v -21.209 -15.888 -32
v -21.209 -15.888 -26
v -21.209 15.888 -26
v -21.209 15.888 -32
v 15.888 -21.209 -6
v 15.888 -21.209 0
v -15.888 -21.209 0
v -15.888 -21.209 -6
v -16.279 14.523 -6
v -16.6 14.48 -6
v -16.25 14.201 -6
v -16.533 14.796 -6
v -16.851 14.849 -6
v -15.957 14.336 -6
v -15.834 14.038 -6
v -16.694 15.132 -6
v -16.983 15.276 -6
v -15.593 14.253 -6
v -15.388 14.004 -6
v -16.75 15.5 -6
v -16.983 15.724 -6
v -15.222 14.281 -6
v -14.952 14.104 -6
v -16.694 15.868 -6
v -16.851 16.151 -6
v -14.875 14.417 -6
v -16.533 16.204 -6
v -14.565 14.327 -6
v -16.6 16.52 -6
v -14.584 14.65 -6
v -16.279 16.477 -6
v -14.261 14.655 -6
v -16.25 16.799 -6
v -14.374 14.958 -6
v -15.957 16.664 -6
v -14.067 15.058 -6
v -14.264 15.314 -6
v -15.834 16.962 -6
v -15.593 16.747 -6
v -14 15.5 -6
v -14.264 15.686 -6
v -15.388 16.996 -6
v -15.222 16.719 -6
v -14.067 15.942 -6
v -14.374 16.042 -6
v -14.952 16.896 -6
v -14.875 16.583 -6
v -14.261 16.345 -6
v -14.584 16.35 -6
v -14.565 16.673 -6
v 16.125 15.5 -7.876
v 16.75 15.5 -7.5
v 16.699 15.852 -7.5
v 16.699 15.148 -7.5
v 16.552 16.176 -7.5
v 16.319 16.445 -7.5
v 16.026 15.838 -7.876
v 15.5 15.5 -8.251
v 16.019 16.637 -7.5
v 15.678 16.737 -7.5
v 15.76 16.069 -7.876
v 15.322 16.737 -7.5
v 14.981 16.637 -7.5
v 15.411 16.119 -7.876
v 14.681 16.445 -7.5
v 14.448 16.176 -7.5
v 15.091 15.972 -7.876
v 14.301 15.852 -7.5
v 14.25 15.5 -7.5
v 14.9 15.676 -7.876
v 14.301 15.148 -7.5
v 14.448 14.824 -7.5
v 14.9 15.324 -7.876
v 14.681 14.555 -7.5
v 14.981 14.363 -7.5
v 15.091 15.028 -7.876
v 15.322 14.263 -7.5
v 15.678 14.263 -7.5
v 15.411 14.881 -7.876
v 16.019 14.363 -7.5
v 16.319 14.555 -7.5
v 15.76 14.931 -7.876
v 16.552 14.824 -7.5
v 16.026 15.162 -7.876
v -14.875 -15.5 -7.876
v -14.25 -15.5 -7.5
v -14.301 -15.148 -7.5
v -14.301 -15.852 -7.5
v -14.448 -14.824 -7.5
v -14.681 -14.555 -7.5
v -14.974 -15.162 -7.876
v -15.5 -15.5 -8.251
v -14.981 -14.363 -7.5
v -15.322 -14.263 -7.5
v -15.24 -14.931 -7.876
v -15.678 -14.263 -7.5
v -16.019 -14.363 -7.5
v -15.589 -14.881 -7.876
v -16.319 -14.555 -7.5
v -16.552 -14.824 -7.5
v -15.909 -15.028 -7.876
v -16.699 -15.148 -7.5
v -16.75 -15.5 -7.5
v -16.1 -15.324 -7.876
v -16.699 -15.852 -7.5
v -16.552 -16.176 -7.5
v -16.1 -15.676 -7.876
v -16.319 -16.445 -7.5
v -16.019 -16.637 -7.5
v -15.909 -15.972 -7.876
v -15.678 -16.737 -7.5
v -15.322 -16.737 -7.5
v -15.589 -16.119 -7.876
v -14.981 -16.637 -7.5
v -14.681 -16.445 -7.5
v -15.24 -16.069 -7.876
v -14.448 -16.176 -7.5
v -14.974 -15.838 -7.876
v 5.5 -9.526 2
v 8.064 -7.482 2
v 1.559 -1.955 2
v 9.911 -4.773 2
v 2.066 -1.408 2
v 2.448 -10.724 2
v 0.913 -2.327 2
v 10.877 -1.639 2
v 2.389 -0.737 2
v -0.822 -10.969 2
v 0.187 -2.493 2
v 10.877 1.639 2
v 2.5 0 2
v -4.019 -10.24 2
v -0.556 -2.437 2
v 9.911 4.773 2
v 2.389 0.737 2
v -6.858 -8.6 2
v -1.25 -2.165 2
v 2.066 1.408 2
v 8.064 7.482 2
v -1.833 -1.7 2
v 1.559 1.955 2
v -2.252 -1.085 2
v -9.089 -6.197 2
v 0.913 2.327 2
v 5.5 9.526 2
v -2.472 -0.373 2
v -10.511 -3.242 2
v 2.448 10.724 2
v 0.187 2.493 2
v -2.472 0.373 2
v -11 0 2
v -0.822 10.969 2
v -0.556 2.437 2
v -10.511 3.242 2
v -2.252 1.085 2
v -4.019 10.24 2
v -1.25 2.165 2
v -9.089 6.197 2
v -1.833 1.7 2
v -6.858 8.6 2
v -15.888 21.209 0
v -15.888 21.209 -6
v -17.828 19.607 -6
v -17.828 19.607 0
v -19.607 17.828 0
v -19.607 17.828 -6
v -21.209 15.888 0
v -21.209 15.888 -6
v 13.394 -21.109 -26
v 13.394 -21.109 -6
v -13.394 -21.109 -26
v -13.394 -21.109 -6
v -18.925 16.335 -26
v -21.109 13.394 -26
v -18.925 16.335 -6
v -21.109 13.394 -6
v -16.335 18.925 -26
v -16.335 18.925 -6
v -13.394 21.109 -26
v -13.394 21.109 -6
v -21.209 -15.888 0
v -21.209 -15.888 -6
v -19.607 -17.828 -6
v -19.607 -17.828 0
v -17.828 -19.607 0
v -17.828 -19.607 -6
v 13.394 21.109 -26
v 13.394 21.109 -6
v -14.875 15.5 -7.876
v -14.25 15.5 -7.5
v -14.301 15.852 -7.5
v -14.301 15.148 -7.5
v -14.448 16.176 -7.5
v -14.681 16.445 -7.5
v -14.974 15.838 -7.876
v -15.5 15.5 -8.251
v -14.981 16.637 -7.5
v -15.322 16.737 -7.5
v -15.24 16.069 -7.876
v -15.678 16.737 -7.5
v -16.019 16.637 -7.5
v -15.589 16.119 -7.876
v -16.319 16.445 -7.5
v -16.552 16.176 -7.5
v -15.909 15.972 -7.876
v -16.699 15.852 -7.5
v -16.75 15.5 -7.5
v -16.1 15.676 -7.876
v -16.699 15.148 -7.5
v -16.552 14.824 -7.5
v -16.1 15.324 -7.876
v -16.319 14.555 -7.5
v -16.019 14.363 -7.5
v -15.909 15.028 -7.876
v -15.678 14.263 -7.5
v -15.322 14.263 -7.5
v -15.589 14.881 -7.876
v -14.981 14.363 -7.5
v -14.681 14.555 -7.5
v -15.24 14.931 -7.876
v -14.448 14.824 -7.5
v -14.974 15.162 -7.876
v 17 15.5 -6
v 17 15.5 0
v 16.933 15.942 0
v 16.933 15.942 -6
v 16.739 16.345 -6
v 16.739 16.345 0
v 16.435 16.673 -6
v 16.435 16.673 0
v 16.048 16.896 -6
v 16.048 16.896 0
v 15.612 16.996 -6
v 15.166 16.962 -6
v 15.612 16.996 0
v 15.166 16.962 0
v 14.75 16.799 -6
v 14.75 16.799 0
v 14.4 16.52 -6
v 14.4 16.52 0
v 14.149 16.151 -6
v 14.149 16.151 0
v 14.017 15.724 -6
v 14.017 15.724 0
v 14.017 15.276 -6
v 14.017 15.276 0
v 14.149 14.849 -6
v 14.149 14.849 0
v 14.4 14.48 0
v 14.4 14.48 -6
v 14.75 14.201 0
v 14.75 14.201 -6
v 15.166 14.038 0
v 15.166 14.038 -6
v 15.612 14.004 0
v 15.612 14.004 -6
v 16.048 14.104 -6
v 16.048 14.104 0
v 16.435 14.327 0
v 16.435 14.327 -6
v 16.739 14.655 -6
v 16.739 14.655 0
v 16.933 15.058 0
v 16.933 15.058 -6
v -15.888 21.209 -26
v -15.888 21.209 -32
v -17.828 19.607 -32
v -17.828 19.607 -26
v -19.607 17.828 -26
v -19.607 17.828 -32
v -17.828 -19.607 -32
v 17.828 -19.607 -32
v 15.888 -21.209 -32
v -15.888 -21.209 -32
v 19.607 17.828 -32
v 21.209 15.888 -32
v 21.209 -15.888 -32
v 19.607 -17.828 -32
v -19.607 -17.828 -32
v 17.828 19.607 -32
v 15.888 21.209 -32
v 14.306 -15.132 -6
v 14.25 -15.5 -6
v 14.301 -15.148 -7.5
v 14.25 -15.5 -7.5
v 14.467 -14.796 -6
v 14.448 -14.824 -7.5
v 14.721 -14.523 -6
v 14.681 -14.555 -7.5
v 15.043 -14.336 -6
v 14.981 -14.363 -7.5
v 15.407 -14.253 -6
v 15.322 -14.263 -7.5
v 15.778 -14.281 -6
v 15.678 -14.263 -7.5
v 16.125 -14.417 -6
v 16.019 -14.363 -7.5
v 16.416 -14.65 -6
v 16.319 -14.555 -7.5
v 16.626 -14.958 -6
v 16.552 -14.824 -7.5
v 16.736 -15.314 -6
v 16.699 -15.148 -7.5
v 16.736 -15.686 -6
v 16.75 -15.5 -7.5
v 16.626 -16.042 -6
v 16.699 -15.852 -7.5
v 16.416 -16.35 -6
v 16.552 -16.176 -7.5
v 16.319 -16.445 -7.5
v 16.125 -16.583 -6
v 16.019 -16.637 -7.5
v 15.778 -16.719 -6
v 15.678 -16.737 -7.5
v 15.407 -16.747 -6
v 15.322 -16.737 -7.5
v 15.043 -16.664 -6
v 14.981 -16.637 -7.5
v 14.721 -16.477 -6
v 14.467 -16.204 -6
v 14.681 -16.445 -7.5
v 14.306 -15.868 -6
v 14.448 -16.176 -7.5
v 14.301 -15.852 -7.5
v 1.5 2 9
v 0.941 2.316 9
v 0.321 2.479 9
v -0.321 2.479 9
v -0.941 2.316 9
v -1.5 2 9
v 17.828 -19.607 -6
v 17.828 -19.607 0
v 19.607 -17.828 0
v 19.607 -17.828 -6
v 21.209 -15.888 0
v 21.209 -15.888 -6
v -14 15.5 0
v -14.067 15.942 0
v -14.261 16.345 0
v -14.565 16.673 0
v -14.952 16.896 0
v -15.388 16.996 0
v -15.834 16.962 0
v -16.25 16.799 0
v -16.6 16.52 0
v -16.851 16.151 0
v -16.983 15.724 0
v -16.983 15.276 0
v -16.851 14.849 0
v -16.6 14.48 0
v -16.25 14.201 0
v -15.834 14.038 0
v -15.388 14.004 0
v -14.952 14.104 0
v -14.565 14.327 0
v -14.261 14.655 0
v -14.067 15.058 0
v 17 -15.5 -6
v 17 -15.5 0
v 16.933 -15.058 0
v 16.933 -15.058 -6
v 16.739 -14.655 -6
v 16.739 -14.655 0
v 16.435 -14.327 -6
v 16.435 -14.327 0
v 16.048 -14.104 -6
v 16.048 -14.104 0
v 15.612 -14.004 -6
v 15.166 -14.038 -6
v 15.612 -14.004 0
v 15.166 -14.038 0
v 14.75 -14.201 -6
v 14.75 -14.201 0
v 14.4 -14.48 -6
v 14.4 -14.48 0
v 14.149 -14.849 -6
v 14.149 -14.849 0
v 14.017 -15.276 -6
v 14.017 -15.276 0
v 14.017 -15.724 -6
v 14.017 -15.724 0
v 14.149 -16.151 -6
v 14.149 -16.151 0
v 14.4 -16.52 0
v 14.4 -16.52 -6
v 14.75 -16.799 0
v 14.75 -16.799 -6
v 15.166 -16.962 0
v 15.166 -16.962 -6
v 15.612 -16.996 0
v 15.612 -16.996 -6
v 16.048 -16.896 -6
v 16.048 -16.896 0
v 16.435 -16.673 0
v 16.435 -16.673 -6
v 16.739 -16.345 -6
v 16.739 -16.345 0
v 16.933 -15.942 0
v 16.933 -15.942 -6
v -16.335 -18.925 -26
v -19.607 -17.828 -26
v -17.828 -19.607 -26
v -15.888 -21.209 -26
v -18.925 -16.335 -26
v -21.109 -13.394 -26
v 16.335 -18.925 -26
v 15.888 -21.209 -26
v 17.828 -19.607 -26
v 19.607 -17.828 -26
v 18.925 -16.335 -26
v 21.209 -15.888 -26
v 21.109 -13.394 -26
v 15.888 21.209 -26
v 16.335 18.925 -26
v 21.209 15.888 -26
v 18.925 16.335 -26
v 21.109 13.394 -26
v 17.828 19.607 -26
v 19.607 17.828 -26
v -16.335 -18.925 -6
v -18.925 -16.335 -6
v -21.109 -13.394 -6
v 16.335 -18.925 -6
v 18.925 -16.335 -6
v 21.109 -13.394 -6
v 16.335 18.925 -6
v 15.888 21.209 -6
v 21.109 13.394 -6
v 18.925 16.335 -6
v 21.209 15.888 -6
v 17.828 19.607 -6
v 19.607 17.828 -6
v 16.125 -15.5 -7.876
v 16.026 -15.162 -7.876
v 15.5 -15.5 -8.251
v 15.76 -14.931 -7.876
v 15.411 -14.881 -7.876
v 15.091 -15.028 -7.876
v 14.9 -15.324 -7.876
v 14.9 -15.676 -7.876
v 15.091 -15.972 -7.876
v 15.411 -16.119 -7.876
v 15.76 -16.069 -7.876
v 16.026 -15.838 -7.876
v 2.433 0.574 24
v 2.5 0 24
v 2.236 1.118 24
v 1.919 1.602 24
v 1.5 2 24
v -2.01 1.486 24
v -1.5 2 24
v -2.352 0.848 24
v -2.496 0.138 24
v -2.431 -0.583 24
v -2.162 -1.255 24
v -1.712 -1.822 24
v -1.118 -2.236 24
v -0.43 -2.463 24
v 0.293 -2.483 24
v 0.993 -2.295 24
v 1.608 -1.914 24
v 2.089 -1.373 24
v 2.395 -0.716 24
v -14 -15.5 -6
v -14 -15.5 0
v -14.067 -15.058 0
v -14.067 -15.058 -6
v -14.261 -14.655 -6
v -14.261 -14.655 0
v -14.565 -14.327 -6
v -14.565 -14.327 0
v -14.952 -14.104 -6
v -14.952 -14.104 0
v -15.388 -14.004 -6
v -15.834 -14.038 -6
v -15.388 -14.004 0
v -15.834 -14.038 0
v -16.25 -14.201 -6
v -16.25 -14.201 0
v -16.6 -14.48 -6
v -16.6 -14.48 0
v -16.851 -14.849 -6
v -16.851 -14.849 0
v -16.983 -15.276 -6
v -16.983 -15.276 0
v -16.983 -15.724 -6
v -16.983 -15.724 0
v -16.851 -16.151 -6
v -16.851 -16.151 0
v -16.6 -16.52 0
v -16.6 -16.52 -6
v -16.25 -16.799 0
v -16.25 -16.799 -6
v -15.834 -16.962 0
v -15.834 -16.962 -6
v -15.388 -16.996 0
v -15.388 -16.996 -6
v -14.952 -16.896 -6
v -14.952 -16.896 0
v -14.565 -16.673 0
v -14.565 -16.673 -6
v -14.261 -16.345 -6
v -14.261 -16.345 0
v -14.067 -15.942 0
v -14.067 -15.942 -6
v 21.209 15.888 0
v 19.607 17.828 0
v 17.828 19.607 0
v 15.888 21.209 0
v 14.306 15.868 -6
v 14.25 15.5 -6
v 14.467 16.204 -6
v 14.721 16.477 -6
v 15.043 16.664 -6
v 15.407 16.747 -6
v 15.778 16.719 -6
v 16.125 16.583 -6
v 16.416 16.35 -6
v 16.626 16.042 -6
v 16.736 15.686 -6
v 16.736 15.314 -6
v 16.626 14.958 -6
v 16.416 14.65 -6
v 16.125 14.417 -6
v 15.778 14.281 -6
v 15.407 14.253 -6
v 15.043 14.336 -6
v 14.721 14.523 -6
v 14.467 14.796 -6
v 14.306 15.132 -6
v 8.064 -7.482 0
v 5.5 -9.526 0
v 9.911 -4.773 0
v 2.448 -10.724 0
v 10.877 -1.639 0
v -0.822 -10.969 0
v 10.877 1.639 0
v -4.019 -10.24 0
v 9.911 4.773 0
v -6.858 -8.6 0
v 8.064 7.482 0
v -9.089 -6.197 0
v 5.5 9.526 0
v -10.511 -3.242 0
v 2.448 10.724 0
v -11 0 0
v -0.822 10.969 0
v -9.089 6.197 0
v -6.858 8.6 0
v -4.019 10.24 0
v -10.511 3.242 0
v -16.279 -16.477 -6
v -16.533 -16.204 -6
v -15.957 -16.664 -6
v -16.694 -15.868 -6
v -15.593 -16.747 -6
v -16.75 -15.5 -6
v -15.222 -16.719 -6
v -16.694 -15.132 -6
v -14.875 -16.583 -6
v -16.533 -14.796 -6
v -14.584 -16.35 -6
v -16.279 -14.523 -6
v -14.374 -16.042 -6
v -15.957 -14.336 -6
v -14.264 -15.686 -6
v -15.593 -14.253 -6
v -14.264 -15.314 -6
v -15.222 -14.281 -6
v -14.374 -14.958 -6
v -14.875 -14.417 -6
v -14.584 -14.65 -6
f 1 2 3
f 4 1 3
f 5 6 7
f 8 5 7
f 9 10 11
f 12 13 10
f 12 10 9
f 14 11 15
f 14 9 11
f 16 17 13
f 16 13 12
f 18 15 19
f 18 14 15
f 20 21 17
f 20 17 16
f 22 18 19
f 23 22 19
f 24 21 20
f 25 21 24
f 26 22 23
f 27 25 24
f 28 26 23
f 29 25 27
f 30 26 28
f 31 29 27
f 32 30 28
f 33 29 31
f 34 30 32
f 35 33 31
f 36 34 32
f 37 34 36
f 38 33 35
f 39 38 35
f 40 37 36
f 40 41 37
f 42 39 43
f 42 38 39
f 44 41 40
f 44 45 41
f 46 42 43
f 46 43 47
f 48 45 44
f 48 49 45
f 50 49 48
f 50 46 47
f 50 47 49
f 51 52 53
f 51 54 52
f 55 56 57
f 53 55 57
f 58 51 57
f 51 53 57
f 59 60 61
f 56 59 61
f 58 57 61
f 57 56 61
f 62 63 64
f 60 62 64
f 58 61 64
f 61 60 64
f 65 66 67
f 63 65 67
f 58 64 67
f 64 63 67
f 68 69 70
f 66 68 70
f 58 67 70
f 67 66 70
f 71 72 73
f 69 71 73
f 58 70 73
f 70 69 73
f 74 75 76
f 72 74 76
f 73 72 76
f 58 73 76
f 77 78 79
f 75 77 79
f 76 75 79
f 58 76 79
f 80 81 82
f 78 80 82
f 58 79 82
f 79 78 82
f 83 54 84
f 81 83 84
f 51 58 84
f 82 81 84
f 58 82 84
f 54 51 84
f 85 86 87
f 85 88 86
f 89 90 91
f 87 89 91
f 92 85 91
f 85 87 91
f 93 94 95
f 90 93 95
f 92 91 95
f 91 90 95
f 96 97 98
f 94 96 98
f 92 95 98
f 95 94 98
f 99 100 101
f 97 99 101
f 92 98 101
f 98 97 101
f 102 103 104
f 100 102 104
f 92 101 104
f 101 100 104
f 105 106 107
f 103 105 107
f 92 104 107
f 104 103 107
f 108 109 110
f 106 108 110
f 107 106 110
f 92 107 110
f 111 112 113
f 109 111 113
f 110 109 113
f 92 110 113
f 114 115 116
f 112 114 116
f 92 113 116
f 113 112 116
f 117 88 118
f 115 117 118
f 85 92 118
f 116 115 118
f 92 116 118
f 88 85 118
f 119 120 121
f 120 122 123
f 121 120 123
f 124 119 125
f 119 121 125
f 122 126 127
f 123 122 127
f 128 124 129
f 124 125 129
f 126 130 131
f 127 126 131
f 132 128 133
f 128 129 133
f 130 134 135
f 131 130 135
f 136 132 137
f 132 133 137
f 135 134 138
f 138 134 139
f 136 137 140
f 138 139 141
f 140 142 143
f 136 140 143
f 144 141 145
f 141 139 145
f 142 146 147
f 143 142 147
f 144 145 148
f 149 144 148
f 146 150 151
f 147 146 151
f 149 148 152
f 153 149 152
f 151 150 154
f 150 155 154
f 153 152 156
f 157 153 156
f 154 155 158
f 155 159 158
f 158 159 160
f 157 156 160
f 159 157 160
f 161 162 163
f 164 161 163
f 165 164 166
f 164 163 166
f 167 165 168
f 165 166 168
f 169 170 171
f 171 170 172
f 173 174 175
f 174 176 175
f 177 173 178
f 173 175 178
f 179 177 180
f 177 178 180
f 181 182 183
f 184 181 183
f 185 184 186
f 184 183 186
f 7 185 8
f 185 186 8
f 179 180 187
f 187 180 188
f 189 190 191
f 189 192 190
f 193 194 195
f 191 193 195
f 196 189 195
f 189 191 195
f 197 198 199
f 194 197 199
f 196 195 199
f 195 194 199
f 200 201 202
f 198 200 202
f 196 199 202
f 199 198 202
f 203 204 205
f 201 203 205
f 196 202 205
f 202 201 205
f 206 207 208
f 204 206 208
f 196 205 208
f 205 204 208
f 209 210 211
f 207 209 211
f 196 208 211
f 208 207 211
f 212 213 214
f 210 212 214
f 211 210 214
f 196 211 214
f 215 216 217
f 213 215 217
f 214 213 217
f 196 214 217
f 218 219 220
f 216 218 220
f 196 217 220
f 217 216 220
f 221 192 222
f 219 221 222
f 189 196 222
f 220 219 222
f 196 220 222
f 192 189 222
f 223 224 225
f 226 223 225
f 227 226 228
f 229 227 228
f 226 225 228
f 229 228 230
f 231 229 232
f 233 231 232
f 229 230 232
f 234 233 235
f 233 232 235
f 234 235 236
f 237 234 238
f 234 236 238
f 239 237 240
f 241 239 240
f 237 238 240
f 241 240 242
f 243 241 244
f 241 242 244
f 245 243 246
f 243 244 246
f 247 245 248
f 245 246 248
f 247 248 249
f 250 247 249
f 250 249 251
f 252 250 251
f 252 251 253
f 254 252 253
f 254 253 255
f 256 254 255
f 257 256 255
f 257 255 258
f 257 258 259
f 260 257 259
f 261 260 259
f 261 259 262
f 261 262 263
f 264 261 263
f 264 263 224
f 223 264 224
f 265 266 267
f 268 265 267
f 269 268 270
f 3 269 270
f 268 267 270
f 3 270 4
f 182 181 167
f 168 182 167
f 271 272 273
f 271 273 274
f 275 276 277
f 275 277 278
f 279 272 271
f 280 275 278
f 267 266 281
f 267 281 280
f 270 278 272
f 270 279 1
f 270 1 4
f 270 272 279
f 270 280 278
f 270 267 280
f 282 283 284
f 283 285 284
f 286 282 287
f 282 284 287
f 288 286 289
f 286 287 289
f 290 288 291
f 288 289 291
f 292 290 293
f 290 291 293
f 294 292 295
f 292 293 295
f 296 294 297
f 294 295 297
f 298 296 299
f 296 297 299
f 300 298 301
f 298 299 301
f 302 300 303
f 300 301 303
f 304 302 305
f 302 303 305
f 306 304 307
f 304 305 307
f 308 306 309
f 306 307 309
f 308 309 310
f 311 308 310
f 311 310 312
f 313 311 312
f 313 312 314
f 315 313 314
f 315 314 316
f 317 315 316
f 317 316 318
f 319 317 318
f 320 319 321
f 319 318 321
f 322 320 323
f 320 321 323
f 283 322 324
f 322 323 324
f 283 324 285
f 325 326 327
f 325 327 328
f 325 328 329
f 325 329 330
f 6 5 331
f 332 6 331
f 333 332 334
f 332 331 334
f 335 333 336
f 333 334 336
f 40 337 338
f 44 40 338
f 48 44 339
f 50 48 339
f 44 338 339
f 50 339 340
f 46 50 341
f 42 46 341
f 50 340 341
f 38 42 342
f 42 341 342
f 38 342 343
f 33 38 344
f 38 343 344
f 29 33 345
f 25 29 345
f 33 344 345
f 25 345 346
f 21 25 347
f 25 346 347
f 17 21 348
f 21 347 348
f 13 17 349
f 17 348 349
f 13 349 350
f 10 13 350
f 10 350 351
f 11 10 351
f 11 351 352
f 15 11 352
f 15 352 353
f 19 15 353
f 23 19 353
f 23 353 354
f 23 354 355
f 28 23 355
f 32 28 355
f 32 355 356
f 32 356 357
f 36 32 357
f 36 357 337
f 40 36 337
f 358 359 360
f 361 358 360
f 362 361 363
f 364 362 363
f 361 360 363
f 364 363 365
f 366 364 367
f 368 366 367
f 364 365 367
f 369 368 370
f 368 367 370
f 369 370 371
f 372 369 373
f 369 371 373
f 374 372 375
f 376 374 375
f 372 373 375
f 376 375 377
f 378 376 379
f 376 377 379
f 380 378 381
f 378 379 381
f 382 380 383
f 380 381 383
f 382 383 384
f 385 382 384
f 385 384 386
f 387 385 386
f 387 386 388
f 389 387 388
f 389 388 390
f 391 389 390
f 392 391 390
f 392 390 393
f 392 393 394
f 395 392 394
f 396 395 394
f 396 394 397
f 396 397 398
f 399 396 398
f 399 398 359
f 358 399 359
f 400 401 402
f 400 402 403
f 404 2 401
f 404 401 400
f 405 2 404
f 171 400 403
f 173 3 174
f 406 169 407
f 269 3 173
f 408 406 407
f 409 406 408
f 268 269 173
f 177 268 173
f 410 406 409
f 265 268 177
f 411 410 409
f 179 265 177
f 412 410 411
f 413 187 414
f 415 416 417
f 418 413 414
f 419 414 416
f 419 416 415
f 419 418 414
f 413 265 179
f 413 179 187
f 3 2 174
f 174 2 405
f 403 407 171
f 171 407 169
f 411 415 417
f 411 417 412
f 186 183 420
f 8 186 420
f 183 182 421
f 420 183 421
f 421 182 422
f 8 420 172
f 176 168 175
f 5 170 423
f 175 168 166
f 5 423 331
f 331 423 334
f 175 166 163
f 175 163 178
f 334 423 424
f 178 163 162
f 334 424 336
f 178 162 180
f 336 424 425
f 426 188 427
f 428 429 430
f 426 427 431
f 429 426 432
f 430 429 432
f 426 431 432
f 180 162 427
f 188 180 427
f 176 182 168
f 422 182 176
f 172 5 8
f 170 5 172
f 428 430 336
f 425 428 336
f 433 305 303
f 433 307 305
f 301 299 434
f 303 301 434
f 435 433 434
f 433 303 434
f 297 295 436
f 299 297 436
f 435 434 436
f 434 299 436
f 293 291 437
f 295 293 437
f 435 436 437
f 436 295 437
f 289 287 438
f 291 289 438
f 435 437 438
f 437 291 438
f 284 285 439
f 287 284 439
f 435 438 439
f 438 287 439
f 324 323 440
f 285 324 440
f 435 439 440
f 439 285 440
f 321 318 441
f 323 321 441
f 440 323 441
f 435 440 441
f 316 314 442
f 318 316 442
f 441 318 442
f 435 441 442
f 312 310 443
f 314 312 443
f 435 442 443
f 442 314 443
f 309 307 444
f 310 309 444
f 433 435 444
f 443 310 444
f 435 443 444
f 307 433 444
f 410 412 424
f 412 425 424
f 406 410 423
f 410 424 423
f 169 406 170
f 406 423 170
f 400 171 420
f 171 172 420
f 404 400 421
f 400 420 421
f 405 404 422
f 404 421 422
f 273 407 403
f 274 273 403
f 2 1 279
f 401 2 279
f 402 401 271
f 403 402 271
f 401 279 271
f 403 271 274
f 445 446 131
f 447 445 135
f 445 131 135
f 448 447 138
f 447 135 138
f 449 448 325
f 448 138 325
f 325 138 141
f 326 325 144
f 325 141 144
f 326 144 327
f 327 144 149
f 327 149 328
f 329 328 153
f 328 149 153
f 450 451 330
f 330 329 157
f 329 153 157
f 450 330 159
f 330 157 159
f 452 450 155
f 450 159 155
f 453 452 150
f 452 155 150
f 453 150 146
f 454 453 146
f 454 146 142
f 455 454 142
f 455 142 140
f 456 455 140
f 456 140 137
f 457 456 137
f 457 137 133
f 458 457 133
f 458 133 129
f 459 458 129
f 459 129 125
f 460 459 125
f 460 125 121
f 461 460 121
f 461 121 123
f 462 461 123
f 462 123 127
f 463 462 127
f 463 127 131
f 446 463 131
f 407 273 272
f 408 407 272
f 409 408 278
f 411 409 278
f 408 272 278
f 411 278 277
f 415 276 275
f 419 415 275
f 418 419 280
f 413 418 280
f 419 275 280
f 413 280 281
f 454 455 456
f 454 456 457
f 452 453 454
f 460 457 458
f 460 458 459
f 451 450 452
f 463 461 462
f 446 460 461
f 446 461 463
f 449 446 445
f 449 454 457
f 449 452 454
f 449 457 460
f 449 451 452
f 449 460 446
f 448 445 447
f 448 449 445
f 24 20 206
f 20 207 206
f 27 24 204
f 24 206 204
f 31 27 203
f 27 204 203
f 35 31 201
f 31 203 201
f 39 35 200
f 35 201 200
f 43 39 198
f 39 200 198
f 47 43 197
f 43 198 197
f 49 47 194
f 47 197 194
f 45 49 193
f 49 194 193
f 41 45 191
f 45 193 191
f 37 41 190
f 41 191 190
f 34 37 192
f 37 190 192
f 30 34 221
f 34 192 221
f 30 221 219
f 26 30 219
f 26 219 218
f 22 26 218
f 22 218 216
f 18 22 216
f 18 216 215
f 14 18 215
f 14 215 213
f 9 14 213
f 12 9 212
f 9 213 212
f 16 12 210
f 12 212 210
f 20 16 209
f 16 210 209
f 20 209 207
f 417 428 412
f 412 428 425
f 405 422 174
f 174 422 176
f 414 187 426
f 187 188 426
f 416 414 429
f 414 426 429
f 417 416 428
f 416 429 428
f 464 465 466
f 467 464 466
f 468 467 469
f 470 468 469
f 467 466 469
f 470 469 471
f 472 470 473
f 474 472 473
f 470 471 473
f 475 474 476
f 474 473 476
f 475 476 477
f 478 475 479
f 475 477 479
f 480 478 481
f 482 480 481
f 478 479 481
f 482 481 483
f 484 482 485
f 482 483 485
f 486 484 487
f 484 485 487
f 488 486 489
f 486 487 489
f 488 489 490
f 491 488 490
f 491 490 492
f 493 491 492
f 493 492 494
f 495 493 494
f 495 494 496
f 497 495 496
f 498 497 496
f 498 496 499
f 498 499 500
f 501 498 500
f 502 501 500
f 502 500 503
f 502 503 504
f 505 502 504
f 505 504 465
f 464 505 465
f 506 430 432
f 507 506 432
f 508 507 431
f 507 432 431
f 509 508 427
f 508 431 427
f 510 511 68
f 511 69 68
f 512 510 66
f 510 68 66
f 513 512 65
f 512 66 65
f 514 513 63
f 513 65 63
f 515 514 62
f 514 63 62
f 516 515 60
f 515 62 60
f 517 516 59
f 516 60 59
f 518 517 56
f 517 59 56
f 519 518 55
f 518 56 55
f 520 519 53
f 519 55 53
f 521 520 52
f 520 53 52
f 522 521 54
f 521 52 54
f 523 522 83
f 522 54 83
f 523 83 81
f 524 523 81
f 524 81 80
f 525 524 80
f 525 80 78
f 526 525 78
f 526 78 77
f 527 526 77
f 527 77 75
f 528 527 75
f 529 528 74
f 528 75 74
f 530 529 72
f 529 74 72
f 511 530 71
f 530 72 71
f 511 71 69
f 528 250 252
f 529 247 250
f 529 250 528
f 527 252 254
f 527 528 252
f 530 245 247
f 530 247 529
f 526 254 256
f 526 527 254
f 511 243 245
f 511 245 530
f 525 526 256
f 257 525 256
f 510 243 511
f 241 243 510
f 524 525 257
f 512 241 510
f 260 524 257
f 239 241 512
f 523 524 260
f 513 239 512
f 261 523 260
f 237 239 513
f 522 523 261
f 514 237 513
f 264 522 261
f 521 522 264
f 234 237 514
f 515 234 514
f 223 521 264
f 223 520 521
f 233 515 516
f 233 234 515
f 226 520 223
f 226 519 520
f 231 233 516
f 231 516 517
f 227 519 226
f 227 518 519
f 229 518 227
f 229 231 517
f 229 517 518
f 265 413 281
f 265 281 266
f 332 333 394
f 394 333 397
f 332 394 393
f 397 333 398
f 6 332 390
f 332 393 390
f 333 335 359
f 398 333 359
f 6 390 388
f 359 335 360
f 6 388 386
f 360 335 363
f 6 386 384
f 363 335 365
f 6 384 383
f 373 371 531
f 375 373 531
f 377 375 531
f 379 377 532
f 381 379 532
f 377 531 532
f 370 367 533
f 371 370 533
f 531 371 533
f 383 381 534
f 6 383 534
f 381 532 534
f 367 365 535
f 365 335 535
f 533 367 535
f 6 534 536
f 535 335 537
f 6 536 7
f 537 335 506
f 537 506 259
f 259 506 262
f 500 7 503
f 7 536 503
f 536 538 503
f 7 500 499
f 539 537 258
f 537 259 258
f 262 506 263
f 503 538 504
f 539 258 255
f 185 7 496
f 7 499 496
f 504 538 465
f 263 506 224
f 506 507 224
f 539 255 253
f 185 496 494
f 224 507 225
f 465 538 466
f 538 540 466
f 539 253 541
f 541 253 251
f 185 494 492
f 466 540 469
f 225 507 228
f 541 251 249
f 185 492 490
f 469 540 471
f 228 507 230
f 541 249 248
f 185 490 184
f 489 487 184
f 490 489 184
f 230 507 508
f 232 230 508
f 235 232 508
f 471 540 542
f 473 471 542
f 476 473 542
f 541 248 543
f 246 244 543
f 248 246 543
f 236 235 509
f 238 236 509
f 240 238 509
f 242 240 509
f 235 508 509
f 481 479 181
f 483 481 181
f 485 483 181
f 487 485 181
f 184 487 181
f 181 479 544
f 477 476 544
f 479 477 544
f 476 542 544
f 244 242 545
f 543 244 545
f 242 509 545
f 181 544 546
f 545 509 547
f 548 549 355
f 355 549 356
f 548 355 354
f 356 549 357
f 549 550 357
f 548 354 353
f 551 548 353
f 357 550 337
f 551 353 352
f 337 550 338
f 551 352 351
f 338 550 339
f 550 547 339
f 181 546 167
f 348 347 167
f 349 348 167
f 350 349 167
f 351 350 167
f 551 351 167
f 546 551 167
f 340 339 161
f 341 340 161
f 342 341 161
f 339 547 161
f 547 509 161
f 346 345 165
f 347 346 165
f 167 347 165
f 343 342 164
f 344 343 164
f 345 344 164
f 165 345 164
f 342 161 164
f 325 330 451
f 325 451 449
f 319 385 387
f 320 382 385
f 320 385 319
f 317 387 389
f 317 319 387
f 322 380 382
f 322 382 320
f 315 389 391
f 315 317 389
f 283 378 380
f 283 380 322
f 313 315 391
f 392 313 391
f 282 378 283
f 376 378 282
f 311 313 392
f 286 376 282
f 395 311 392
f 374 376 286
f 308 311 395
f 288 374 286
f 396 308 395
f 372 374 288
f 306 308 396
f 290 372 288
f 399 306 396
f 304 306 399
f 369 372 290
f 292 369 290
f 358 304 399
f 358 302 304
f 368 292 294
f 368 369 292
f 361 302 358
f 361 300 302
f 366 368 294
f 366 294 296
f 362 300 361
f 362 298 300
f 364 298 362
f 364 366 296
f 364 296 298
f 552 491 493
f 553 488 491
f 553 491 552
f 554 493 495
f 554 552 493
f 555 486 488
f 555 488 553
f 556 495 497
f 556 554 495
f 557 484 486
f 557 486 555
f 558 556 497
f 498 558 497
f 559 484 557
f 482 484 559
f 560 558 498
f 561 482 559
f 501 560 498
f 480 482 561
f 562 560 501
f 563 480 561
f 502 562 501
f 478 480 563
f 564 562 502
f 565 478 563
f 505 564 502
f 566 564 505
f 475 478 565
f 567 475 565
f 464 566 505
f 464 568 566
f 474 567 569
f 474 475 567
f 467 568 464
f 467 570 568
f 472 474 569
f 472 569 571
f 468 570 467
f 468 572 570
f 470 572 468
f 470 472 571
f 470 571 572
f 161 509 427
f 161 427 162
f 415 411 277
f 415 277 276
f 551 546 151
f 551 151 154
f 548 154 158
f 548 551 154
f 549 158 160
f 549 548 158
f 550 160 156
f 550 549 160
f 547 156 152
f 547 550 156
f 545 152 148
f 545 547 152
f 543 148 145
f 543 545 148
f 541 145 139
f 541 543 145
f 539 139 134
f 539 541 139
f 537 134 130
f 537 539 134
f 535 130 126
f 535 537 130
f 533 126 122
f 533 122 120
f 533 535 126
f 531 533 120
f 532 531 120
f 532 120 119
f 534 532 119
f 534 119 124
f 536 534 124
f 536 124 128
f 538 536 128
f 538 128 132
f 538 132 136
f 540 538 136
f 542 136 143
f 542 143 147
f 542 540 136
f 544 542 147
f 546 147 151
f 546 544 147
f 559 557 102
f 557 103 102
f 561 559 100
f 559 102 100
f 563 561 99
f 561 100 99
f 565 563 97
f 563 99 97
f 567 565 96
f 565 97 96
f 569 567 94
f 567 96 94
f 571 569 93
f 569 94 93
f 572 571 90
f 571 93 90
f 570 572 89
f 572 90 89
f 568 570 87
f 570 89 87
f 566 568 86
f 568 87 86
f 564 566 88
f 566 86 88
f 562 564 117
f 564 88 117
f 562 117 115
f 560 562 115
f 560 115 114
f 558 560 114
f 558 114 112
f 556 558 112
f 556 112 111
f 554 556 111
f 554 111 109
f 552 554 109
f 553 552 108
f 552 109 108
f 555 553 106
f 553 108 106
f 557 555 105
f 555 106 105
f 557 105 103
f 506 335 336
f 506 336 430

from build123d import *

# Parameters (mm, degrees)
SKETCH1_R                       = 2.5
BOSS_EXTRUDE1_DEPTH             = 24
SKETCH2_R                       = 11
BOSS_EXTRUDE2_DEPTH             = 2
SKETCH3_W                       = 42.418
SKETCH3_H                       = 42.418
BOSS_EXTRUDE3_DEPTH             = 32
CUT_EXTRUDE1_DEPTH              = 64.526713767
M3X0_5_TAPPED_HOLE1_D           = 2.5
M3X0_5_TAPPED_HOLE1_DEPTH       = 7.5
M3X0_5_TAPPED_HOLE1_CBORE_D     = 3
M3X0_5_TAPPED_HOLE1_CBORE_DEPTH = 6
M3X0_5_TAPPED_HOLE1_TIP         = 0.751075774
CUT_EXTRUDE2_START              = -15
CUT_EXTRUDE2_DEPTH              = 15
CUT_EXTRUDE3_DEPTH              = 10


with BuildPart() as part:
    # Sketch1 → Boss-Extrude1 (new body)
    with BuildSketch(Plane.XY):
        Circle(SKETCH1_R)
    extrude(amount=BOSS_EXTRUDE1_DEPTH)

    # Sketch2 → Boss-Extrude2 (add)
    with BuildSketch(Plane(origin=(0, 0, 0), x_dir=(-1, 0, 0), z_dir=(0, 0, -1))):
        Circle(SKETCH2_R)
    extrude(amount=-BOSS_EXTRUDE2_DEPTH)

    # Sketch3 → Boss-Extrude3 (add)
    with BuildSketch(Plane(origin=(0, 0, 0), x_dir=(-1, 0, 0), z_dir=(0, 0, -1))):
        Rectangle(SKETCH3_W, SKETCH3_H)
    extrude(amount=BOSS_EXTRUDE3_DEPTH)

    # Sketch4 → Cut-Extrude1 (cut, through all)
    with BuildSketch(Plane(origin=(0, 0, -32), x_dir=(-1, 0, 0), z_dir=(0, 0, -1))):
        with BuildLine():
            Line((-21.209, -15.887992919), (-21.209, -21.209))
            Line((-21.209, -21.209), (-15.887992919, -21.209))
            ThreePointArc((-15.887992919, -21.209), (-18.738329701, -18.738329701), (-21.209, -15.887992919))
        make_face()
        with BuildLine():
            Line((15.887992919, -21.209), (21.209, -21.209))
            Line((21.209, -21.209), (21.209, -15.887992919))
            ThreePointArc((21.209, -15.887992919), (18.738329701, -18.738329701), (15.887992919, -21.209))
        make_face()
        with BuildLine():
            Line((21.209, 15.887992919), (21.209, 21.209))
            Line((21.209, 21.209), (15.887992919, 21.209))
            ThreePointArc((15.887992919, 21.209), (18.738329701, 18.738329701), (21.209, 15.887992919))
        make_face()
        with BuildLine():
            Line((-15.887992919, 21.209), (-21.209, 21.209))
            Line((-21.209, 21.209), (-21.209, 15.887992919))
            ThreePointArc((-21.209, 15.887992919), (-18.738329701, 18.738329701), (-15.887992919, 21.209))
        make_face()
    extrude(amount=-CUT_EXTRUDE1_DEPTH, mode=Mode.SUBTRACT)

    # M3x0.5 Tapped Hole1
    with Locations(Plane.XY):
        with Locations((-15.5, 15.5), (-15.5, -15.5), (15.5, -15.5), (15.5, 15.5)):
            CounterBoreHole(M3X0_5_TAPPED_HOLE1_D / 2, M3X0_5_TAPPED_HOLE1_CBORE_D / 2, M3X0_5_TAPPED_HOLE1_CBORE_DEPTH, depth=M3X0_5_TAPPED_HOLE1_DEPTH)
            with Locations((0, 0, -(M3X0_5_TAPPED_HOLE1_DEPTH + M3X0_5_TAPPED_HOLE1_TIP / 2))):  # 118° drill point
                Cone(0, M3X0_5_TAPPED_HOLE1_D / 2, M3X0_5_TAPPED_HOLE1_TIP, mode=Mode.SUBTRACT)

    # Sketch7 → Cut-Extrude2 (cut)
    with BuildSketch(Plane.XY.offset(24).offset(CUT_EXTRUDE2_START)):
        with BuildLine():
            Line((-1.5, 2), (1.5, 2))
            ThreePointArc((1.5, 2), (0, 2.5), (-1.5, 2))
        make_face()
    extrude(amount=CUT_EXTRUDE2_DEPTH, mode=Mode.SUBTRACT)

    # Sketch8 → Cut-Extrude3 (cut, symmetric)
    with BuildSketch(Plane.XY.offset(-16)):
        with BuildLine():
            Line((15.887992919, 21.209), (-15.887992919, 21.209))
            ThreePointArc((-15.887992919, 21.209), (-18.738329701, 18.738329701), (-21.209, 15.887992919))
            Line((-21.209, 15.887992919), (-21.209, -15.887992919))
            ThreePointArc((-21.209, -15.887992919), (-18.738329701, -18.738329701), (-15.887992919, -21.209))
            Line((-15.887992919, -21.209), (15.887992919, -21.209))
            ThreePointArc((15.887992919, -21.209), (18.738329701, -18.738329701), (21.209, -15.887992919))
            Line((21.209, -15.887992919), (21.209, 15.887992919))
            ThreePointArc((21.209, 15.887992919), (18.738329701, 18.738329701), (15.887992919, 21.209))
        make_face()
        with BuildLine():
            Line((-13.394406258, 21.109), (13.394406258, 21.109))
            ThreePointArc((13.394406258, 21.109), (17.67766953, 17.67766953), (21.109, 13.394406258))
            Line((21.109, 13.394406258), (21.109, -13.394406258))
            ThreePointArc((21.109, -13.394406258), (17.67766953, -17.67766953), (13.394406258, -21.109))
            Line((13.394406258, -21.109), (-13.394406258, -21.109))
            ThreePointArc((-13.394406258, -21.109), (-17.67766953, -17.67766953), (-21.109, -13.394406258))
            Line((-21.109, -13.394406258), (-21.109, 13.394406258))
            ThreePointArc((-21.109, 13.394406258), (-17.67766953, 17.67766953), (-13.394406258, 21.109))
        make_face(mode=Mode.SUBTRACT)
    extrude(amount=CUT_EXTRUDE3_DEPTH, both=True, mode=Mode.SUBTRACT)


solid = part.part
